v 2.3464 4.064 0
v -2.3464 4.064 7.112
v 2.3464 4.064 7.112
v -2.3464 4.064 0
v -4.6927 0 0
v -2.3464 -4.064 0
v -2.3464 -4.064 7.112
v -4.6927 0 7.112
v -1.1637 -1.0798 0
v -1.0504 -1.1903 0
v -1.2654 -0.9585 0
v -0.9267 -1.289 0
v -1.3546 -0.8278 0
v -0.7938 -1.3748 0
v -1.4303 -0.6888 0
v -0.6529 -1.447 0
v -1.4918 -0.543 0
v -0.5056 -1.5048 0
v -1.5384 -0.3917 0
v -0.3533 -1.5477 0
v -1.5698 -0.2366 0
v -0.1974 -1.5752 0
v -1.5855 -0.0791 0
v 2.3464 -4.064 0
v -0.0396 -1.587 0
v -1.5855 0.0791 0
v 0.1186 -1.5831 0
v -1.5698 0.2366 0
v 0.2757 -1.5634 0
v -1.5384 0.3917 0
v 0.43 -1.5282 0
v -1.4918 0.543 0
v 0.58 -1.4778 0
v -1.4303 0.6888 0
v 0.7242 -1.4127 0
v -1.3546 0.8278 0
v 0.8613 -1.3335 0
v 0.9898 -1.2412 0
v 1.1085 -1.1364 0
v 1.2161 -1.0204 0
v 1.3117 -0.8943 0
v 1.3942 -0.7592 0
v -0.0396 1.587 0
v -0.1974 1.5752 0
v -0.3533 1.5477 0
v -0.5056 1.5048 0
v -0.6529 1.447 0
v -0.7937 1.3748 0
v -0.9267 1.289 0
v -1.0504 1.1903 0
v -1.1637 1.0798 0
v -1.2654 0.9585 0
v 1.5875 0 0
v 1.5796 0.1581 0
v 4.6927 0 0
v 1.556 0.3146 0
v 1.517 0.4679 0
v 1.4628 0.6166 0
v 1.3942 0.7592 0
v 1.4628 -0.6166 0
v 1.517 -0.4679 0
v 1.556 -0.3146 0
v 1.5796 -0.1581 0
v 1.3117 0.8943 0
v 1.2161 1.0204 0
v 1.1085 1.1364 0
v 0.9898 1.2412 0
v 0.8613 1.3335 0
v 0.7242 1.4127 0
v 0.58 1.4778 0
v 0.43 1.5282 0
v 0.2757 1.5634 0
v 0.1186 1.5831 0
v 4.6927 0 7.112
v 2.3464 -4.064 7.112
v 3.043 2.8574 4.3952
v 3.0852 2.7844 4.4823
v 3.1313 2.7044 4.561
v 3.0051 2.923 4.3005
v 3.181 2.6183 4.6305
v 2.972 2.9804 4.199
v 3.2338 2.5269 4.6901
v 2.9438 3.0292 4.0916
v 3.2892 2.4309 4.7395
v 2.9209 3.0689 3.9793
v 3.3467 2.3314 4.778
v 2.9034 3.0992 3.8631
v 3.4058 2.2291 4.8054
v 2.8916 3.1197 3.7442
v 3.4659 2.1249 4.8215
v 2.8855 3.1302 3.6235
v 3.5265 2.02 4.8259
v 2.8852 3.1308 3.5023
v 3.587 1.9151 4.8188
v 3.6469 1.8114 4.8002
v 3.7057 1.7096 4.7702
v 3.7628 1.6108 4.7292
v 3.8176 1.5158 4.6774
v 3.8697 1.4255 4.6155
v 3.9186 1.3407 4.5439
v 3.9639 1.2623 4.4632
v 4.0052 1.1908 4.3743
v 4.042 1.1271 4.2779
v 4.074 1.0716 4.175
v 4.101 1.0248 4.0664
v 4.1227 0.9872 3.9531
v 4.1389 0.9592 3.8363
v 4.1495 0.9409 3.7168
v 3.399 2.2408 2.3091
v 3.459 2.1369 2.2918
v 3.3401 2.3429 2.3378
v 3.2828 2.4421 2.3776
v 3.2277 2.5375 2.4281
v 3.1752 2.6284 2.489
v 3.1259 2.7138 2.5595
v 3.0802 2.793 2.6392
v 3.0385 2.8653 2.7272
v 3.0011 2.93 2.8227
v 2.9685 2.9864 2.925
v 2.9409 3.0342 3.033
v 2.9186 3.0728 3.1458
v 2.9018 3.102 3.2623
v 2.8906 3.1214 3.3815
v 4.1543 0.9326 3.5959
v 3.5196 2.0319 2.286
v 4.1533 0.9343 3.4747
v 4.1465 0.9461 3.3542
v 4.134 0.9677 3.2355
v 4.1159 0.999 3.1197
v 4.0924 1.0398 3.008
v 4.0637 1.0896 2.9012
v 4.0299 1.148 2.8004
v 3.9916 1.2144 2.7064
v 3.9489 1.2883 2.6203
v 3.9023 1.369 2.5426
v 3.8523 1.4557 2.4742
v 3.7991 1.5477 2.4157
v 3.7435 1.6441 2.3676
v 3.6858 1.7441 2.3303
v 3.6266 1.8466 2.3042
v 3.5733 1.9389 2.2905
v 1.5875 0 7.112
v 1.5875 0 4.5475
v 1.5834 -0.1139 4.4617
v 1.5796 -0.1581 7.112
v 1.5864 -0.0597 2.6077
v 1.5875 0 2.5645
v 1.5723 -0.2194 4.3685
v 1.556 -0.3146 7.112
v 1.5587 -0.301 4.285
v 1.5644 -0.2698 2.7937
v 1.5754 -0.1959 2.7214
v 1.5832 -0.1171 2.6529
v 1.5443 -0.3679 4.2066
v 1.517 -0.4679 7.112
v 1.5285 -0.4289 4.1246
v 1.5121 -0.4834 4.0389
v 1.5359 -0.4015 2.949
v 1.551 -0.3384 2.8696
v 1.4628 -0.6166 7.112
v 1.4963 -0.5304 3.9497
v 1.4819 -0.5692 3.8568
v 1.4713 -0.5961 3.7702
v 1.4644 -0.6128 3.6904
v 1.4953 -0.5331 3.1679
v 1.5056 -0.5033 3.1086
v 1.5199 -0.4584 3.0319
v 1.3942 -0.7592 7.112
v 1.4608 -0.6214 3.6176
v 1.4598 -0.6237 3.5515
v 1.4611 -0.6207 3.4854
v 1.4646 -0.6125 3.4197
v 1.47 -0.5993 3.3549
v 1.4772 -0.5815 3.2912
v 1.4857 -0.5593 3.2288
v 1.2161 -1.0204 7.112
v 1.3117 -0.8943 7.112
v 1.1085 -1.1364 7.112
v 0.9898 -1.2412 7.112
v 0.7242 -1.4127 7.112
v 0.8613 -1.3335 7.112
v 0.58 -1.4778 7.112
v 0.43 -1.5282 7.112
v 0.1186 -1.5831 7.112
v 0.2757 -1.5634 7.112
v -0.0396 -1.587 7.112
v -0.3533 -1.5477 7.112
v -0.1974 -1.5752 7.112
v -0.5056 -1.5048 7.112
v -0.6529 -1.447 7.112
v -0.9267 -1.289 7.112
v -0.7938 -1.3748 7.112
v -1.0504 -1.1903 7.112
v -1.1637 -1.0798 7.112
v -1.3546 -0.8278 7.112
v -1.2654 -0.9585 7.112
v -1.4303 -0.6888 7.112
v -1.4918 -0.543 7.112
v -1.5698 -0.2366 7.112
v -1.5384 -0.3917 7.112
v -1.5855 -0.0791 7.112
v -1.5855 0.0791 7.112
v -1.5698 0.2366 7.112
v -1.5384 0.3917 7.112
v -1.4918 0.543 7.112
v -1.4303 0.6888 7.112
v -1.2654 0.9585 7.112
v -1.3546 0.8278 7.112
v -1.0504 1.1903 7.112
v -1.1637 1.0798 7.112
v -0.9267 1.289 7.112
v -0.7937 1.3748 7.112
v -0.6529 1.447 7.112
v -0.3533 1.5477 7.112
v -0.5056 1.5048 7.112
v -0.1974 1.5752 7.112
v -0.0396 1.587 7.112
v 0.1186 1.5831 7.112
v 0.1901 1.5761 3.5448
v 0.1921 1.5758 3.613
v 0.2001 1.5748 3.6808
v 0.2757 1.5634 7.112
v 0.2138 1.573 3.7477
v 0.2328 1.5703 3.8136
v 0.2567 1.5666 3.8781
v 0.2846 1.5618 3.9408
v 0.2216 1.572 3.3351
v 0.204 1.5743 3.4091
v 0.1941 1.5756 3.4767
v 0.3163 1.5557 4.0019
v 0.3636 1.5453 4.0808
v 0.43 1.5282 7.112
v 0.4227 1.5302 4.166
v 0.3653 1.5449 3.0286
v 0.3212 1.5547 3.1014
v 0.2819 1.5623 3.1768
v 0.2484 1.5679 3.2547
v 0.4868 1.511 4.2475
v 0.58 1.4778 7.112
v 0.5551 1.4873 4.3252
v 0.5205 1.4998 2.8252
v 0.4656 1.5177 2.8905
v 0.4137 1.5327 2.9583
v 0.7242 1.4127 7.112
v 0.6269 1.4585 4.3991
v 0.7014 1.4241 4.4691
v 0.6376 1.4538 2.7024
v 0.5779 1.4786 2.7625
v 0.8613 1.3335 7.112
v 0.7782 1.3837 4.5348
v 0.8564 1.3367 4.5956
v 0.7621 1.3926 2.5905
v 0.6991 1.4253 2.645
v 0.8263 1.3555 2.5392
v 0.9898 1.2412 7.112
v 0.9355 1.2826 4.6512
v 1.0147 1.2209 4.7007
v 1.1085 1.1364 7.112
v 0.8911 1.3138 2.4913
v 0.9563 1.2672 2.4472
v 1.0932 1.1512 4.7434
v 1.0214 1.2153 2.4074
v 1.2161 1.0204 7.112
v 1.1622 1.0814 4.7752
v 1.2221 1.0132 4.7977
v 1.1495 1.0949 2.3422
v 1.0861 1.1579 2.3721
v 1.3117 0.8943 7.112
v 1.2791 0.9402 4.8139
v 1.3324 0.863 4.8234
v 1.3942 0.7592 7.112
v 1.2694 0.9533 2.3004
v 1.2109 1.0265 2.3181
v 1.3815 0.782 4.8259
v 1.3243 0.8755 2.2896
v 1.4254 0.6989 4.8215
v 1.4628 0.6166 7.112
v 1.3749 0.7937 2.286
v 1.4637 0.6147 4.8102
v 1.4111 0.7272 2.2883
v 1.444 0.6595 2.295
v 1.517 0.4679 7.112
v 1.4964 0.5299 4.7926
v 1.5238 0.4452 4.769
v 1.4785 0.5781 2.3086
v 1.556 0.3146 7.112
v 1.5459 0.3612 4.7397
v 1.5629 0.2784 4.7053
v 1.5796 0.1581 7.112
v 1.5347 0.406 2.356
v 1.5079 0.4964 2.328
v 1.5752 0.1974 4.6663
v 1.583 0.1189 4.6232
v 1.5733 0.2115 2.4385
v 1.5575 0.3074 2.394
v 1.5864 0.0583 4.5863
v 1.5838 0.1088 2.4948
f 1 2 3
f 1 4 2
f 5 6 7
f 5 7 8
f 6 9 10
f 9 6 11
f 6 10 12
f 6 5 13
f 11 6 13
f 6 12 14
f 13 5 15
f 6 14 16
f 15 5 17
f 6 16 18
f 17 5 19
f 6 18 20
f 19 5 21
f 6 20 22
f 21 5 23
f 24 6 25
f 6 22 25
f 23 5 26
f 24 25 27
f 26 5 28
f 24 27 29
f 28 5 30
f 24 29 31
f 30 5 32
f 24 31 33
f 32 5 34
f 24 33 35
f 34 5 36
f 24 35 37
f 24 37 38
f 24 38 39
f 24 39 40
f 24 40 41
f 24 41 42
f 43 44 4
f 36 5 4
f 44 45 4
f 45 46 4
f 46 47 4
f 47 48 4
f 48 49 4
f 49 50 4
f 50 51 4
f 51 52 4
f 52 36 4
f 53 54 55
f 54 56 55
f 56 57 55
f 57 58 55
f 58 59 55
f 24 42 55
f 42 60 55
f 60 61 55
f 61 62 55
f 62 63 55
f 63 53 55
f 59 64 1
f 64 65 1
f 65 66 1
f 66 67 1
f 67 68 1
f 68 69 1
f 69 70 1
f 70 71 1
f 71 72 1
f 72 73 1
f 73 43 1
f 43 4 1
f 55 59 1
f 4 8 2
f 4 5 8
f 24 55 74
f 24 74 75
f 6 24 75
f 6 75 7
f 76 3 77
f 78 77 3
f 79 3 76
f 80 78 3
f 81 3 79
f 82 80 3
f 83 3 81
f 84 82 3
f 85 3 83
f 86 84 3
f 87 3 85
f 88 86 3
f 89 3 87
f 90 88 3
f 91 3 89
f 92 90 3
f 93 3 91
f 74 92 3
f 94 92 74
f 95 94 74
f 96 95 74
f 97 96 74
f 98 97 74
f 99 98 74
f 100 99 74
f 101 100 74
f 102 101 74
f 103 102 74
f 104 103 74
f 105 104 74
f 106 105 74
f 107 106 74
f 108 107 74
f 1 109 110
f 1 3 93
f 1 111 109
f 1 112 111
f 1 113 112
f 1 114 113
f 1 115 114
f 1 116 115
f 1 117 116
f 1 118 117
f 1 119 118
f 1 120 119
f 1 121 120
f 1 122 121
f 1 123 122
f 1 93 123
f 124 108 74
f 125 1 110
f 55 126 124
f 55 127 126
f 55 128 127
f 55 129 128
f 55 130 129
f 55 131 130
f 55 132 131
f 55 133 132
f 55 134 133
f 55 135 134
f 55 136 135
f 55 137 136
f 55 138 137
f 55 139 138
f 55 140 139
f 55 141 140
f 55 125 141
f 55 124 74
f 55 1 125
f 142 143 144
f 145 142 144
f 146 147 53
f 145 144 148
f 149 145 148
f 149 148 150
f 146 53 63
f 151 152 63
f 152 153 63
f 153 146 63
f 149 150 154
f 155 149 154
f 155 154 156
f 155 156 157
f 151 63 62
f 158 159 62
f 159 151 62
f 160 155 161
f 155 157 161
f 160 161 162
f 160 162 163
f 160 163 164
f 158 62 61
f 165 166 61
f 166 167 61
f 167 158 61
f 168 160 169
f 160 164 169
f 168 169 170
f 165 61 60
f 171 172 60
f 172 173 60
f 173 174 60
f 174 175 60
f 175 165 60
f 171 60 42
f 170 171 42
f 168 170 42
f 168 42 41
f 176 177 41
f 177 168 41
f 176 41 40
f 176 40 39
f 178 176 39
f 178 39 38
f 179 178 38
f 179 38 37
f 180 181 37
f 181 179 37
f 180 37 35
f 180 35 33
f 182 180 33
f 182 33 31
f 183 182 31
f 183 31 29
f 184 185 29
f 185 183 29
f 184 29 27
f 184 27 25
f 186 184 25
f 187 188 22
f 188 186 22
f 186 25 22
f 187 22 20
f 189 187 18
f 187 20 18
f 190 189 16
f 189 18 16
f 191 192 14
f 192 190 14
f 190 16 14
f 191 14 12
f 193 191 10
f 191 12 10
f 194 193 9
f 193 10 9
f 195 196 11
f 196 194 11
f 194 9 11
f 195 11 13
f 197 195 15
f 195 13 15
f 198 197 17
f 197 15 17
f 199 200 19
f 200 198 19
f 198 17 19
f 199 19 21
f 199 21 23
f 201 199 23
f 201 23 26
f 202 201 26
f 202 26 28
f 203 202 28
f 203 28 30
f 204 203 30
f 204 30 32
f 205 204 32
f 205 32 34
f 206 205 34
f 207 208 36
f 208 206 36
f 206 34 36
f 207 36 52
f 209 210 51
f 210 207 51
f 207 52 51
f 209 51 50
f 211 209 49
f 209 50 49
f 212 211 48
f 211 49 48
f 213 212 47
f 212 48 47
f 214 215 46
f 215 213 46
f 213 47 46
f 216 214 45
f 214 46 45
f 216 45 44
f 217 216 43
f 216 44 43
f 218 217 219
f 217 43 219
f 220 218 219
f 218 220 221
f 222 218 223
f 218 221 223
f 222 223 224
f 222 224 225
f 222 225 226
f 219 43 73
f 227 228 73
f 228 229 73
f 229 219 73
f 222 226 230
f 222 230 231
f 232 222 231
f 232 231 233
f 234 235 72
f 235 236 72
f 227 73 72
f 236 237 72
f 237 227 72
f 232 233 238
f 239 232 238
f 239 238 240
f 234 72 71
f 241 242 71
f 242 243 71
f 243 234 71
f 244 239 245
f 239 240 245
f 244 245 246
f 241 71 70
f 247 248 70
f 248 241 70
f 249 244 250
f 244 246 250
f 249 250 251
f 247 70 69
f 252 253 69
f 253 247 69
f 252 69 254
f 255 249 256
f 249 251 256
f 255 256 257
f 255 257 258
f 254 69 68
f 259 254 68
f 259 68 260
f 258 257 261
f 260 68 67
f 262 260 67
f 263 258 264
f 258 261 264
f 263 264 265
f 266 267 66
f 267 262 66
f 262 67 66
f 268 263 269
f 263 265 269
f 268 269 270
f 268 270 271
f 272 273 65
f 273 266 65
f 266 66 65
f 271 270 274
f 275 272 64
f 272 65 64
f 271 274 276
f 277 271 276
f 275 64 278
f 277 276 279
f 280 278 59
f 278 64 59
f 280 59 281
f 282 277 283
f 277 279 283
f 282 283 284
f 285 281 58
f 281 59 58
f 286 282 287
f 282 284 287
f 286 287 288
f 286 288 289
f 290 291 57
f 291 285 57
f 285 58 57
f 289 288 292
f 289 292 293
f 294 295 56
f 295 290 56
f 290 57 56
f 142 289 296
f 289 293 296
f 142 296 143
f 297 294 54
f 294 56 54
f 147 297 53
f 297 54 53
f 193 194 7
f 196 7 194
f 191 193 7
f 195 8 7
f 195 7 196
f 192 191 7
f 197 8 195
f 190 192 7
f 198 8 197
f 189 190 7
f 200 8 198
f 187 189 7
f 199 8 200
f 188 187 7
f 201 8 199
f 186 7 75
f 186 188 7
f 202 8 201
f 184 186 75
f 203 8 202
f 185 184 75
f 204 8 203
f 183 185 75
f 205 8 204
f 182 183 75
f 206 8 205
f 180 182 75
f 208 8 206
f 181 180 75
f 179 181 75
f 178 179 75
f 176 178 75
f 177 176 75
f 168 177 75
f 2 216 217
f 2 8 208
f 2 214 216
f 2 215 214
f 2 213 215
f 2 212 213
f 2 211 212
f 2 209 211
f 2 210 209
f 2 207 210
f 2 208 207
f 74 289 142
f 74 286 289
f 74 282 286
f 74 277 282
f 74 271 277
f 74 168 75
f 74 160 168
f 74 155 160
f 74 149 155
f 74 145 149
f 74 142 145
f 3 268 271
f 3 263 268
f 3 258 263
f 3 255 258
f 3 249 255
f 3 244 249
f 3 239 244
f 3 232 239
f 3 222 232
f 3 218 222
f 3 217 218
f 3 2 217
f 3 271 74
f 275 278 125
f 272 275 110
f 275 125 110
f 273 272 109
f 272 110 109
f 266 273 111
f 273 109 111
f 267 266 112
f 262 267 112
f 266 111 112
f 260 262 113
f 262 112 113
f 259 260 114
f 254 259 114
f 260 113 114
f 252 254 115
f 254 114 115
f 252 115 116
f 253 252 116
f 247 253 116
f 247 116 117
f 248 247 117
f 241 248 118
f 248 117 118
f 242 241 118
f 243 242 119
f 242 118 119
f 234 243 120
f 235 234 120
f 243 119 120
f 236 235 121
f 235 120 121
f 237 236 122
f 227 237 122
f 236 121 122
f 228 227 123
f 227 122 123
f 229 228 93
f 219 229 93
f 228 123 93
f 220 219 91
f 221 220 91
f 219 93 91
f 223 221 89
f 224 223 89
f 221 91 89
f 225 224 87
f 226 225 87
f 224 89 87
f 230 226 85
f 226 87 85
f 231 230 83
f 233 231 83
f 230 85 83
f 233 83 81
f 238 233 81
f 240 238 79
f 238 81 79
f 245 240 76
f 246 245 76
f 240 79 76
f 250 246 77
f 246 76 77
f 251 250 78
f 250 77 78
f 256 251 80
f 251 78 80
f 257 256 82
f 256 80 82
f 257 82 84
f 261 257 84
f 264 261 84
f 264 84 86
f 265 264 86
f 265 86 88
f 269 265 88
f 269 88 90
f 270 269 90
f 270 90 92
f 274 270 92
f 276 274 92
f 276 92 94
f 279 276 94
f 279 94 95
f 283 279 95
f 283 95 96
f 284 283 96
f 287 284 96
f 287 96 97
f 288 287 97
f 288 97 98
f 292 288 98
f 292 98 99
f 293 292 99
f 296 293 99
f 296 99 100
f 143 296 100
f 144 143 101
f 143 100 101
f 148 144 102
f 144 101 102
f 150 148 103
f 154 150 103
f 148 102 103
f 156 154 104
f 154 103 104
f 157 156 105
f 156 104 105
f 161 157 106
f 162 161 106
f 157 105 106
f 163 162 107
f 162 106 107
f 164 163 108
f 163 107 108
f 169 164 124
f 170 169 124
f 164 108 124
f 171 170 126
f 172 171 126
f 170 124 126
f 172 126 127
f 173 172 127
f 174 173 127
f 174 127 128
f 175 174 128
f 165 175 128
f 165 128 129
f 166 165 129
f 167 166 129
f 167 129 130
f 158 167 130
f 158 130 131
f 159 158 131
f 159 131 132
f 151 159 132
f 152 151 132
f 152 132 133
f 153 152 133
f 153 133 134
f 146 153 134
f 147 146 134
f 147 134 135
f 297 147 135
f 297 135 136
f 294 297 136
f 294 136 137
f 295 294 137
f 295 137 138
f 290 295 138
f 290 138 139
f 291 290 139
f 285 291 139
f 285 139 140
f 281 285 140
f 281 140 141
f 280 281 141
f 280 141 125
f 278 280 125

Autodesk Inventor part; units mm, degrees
ref_plane "YZ Plane" through (0, 0, 0) normal (1, 0, 0) x (0, 1, 0)
ref_plane "XZ Plane" through (0, 0, 0) normal (0, 1, 0) x (-1, 0, 0)
ref_plane "XY Plane" through (0, 0, 0) normal (0, 0, 1) x (1, 0, 0)
sketch "Sketch1" plane through (0, 0, 0) normal (0, 0, 1) x (1, 0, 0)
  circle A0 centre (0, 0) radius 1.5875
  line L0 (-4.6927, 0) -> (-2.3464, 4.064)
  line L1 (-2.3464, 4.064) -> (2.3464, 4.064)
  line L2 (2.3464, 4.064) -> (4.6927, 0)
  line L3 (4.6927, 0) -> (2.3464, -4.064)
  line L4 (2.3464, -4.064) -> (-2.3464, -4.064)
  line L5 (-2.3464, -4.064) -> (-4.6927, 0)
  dimension "d0" = 3.175
  dimension "d1" = 8.128
extrude "Extrusion1" add sketch "Sketch1" along normal blind 7.112
sketch "Sketch2" plane through (2.3464, 4.064, 7.112) normal (0.866, 0.5, 0) x (0, 0, -1)
  circle A0 centre (3.556, -2.3464) radius 1.27
  line L0 (0, -4.6927) -> (0, 0) projected
  line L1 (7.112, 0) -> (7.112, -4.6927) projected
  line L2 (7.112, 0) -> (0, 0) projected
  line L3 (0, -4.6927) -> (0, 0) projected
  line L4 (7.112, -4.6927) -> (0, -4.6927) projected
  line L5 (3.556, -2.3464) -> (3.556, 0) construction
  line L6 (7.112, 0) -> (0, 0) construction
  line L7 (3.556, -2.3464) -> (3.556, -4.6927) construction
  line L8 (7.112, -4.6927) -> (0, -4.6927) construction
  line L9 (3.556, -2.3464) -> (0, -2.3464) construction
  line L10 (3.556, -2.3464) -> (7.112, -2.3464) construction
  line L11 (7.112, -4.6927) -> (7.112, 0) construction
  dimension "d4" = 2.54
extrude "Extrusion2" cut sketch "Sketch2" against normal up to next contours A0
properties part number ".125InchShaftHexNut" material "Brass, Soft Yellow"
